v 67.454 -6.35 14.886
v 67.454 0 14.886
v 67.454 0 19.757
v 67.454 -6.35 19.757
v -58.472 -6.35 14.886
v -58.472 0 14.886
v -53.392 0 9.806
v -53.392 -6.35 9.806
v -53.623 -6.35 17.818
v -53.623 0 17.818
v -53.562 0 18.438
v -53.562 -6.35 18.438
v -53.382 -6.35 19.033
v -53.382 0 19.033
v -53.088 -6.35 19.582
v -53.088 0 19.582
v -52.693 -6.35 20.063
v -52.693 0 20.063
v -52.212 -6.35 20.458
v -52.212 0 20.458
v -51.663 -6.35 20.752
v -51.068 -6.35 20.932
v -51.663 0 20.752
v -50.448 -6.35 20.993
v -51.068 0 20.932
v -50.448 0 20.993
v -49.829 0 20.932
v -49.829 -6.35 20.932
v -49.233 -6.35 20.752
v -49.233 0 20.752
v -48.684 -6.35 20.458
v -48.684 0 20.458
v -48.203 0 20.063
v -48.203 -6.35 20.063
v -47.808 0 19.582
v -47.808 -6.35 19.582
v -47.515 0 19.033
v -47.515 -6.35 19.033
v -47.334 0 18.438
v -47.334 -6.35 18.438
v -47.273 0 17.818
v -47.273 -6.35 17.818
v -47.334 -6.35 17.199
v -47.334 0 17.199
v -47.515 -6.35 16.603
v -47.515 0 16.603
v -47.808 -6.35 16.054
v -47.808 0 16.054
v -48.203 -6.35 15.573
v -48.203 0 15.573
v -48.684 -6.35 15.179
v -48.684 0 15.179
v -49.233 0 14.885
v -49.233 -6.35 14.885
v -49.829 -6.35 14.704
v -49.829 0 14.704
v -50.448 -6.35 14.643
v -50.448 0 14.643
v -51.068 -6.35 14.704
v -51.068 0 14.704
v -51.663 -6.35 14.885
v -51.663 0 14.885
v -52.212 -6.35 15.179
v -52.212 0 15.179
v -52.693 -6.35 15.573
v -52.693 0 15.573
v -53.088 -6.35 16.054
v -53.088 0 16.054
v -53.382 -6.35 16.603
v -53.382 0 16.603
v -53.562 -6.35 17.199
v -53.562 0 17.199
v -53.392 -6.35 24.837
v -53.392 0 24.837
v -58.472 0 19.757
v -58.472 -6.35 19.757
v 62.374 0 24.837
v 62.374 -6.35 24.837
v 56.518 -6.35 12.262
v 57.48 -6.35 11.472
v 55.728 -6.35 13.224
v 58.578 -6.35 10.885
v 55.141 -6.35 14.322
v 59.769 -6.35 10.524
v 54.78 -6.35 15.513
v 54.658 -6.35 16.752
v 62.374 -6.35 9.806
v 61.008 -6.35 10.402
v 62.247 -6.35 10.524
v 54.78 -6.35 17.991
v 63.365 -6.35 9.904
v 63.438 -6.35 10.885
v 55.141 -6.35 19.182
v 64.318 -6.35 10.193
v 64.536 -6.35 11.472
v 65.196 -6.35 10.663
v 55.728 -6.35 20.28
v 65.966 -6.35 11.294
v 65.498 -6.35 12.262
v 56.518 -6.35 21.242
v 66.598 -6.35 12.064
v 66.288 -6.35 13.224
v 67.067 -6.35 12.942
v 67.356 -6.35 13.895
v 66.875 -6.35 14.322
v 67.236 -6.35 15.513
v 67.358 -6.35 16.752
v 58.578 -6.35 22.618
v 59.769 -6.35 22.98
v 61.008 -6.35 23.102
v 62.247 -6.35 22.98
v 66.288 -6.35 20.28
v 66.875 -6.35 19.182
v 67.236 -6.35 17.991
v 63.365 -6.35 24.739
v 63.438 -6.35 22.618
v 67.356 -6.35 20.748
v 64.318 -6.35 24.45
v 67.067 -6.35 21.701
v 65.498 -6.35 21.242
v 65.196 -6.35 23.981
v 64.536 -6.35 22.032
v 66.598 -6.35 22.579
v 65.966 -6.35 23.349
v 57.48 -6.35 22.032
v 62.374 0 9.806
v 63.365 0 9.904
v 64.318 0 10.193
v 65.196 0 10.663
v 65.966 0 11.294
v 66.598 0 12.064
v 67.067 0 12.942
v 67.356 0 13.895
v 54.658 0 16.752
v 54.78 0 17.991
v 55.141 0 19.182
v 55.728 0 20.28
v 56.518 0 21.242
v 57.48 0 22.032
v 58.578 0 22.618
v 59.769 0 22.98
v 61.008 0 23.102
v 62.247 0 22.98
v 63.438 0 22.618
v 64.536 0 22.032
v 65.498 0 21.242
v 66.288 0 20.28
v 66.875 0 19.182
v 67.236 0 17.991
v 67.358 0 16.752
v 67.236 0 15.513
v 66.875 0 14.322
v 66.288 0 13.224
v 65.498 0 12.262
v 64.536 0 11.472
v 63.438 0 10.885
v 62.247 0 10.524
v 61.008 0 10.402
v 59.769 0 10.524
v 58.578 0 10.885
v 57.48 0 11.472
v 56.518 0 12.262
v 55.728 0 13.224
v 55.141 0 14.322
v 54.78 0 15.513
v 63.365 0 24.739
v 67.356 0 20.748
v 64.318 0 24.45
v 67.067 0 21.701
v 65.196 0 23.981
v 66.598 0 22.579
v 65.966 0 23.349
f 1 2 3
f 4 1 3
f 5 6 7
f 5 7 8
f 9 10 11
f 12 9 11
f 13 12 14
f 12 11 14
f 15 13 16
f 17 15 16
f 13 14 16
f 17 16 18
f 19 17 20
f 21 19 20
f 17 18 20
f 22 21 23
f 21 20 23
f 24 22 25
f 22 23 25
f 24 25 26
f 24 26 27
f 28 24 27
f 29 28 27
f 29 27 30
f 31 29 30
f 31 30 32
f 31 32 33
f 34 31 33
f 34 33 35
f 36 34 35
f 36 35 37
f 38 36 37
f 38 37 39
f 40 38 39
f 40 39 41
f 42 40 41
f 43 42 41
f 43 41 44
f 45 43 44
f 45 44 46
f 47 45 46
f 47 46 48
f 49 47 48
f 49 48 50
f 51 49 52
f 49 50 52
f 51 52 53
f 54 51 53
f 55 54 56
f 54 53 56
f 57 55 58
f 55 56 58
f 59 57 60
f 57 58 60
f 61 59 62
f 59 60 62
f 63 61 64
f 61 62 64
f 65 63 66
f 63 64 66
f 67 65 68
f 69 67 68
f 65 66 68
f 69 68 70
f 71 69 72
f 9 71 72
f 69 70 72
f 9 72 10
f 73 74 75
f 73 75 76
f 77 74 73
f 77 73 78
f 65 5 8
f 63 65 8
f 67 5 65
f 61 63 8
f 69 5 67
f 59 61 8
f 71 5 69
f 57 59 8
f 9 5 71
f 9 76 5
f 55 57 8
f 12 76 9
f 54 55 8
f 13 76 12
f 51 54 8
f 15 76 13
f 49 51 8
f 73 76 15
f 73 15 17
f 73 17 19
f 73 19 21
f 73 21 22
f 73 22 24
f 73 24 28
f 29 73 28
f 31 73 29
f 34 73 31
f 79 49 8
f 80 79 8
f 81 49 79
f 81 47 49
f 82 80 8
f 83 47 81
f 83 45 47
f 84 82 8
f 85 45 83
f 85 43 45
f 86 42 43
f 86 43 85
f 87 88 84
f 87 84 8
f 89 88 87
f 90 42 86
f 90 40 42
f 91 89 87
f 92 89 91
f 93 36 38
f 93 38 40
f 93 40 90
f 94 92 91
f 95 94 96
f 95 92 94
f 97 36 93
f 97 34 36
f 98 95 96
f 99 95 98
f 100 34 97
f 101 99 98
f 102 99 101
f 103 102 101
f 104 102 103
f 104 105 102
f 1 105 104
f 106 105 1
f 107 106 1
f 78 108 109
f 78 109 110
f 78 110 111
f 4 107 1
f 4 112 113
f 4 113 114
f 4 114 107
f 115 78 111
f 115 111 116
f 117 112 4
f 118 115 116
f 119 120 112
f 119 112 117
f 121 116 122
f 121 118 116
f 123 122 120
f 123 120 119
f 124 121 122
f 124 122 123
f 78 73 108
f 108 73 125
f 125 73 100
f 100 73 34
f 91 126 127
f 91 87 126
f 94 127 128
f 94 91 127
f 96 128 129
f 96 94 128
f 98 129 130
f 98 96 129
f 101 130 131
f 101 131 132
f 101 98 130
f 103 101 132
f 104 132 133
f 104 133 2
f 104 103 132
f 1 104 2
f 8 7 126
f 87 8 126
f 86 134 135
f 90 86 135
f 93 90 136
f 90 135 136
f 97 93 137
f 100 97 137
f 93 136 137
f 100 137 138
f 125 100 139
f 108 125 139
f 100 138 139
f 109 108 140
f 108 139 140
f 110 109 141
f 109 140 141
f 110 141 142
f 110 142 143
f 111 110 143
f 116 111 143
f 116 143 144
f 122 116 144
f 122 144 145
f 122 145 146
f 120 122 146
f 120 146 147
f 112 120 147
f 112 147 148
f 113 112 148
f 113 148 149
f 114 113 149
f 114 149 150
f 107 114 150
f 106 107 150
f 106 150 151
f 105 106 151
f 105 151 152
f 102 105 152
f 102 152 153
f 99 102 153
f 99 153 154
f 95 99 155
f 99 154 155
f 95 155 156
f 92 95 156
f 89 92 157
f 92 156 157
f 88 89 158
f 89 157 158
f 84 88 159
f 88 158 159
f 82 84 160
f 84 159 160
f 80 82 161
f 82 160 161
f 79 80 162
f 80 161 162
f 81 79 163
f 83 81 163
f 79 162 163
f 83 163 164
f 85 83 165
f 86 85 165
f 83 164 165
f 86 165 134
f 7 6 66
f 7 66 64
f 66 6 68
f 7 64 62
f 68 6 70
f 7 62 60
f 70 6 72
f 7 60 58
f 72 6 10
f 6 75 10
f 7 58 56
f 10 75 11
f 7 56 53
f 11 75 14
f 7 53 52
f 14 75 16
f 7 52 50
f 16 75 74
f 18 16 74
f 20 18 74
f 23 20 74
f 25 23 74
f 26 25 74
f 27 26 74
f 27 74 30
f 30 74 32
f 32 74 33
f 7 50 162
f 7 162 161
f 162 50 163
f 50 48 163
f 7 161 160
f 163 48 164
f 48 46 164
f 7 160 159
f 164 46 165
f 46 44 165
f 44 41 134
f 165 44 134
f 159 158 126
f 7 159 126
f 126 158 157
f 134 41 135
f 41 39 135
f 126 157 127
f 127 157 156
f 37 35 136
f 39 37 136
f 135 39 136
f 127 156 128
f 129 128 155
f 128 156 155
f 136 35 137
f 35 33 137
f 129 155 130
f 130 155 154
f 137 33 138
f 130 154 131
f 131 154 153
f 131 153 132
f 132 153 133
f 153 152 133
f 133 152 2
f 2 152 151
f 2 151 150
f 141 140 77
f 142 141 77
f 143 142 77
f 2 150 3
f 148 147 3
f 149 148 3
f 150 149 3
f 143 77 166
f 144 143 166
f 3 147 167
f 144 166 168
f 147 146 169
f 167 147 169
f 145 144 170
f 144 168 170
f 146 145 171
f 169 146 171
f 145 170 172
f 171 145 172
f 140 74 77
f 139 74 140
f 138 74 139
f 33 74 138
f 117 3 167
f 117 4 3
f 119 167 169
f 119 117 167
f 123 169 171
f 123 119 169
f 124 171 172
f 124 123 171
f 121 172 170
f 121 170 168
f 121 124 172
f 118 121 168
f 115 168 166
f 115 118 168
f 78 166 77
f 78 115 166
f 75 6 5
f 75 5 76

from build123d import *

# Parameters (mm, degrees)
F0_W     = 125.926391
F0_H     = 15.030515
F1_DEPTH = 6.35
F2_R     = 5.08
F3_SIZE  = 5.08
F5_D     = 12.7
F7_D     = 6.35


with BuildPart() as f1:
    # F0 (on Front) → F1 (new body)
    with BuildSketch(Plane.XZ):
        with Locations((4.490822, 17.321752)):
            Rectangle(F0_W, F0_H)
    extrude(amount=F1_DEPTH)

    # F2
    f2_edges = [f1.edges().sort_by_distance(p)[0] for p in [
        (67.454018, -3.175, 24.83701),
        (67.454018, -3.175, 9.806495),
    ]]
    fillet(f2_edges, radius=F2_R)

    # F3
    f3_edges = [f1.edges().sort_by_distance(p)[0] for p in [
        (-58.472373, -3.175, 24.83701),
        (-58.472373, -3.175, 9.806495),
    ]]
    chamfer(f3_edges, length=F3_SIZE)

    # F5 (through all)
    with Locations(Plane.XZ.offset(6.35)):
        with Locations((61.007891, 16.751822)):
            Hole(F5_D / 2)

    # F7 (through all)
    with Locations(Plane.XZ.offset(6.35)):
        with Locations((-50.448395, 17.818419)):
            Hole(F7_D / 2)


solid = f1.part
